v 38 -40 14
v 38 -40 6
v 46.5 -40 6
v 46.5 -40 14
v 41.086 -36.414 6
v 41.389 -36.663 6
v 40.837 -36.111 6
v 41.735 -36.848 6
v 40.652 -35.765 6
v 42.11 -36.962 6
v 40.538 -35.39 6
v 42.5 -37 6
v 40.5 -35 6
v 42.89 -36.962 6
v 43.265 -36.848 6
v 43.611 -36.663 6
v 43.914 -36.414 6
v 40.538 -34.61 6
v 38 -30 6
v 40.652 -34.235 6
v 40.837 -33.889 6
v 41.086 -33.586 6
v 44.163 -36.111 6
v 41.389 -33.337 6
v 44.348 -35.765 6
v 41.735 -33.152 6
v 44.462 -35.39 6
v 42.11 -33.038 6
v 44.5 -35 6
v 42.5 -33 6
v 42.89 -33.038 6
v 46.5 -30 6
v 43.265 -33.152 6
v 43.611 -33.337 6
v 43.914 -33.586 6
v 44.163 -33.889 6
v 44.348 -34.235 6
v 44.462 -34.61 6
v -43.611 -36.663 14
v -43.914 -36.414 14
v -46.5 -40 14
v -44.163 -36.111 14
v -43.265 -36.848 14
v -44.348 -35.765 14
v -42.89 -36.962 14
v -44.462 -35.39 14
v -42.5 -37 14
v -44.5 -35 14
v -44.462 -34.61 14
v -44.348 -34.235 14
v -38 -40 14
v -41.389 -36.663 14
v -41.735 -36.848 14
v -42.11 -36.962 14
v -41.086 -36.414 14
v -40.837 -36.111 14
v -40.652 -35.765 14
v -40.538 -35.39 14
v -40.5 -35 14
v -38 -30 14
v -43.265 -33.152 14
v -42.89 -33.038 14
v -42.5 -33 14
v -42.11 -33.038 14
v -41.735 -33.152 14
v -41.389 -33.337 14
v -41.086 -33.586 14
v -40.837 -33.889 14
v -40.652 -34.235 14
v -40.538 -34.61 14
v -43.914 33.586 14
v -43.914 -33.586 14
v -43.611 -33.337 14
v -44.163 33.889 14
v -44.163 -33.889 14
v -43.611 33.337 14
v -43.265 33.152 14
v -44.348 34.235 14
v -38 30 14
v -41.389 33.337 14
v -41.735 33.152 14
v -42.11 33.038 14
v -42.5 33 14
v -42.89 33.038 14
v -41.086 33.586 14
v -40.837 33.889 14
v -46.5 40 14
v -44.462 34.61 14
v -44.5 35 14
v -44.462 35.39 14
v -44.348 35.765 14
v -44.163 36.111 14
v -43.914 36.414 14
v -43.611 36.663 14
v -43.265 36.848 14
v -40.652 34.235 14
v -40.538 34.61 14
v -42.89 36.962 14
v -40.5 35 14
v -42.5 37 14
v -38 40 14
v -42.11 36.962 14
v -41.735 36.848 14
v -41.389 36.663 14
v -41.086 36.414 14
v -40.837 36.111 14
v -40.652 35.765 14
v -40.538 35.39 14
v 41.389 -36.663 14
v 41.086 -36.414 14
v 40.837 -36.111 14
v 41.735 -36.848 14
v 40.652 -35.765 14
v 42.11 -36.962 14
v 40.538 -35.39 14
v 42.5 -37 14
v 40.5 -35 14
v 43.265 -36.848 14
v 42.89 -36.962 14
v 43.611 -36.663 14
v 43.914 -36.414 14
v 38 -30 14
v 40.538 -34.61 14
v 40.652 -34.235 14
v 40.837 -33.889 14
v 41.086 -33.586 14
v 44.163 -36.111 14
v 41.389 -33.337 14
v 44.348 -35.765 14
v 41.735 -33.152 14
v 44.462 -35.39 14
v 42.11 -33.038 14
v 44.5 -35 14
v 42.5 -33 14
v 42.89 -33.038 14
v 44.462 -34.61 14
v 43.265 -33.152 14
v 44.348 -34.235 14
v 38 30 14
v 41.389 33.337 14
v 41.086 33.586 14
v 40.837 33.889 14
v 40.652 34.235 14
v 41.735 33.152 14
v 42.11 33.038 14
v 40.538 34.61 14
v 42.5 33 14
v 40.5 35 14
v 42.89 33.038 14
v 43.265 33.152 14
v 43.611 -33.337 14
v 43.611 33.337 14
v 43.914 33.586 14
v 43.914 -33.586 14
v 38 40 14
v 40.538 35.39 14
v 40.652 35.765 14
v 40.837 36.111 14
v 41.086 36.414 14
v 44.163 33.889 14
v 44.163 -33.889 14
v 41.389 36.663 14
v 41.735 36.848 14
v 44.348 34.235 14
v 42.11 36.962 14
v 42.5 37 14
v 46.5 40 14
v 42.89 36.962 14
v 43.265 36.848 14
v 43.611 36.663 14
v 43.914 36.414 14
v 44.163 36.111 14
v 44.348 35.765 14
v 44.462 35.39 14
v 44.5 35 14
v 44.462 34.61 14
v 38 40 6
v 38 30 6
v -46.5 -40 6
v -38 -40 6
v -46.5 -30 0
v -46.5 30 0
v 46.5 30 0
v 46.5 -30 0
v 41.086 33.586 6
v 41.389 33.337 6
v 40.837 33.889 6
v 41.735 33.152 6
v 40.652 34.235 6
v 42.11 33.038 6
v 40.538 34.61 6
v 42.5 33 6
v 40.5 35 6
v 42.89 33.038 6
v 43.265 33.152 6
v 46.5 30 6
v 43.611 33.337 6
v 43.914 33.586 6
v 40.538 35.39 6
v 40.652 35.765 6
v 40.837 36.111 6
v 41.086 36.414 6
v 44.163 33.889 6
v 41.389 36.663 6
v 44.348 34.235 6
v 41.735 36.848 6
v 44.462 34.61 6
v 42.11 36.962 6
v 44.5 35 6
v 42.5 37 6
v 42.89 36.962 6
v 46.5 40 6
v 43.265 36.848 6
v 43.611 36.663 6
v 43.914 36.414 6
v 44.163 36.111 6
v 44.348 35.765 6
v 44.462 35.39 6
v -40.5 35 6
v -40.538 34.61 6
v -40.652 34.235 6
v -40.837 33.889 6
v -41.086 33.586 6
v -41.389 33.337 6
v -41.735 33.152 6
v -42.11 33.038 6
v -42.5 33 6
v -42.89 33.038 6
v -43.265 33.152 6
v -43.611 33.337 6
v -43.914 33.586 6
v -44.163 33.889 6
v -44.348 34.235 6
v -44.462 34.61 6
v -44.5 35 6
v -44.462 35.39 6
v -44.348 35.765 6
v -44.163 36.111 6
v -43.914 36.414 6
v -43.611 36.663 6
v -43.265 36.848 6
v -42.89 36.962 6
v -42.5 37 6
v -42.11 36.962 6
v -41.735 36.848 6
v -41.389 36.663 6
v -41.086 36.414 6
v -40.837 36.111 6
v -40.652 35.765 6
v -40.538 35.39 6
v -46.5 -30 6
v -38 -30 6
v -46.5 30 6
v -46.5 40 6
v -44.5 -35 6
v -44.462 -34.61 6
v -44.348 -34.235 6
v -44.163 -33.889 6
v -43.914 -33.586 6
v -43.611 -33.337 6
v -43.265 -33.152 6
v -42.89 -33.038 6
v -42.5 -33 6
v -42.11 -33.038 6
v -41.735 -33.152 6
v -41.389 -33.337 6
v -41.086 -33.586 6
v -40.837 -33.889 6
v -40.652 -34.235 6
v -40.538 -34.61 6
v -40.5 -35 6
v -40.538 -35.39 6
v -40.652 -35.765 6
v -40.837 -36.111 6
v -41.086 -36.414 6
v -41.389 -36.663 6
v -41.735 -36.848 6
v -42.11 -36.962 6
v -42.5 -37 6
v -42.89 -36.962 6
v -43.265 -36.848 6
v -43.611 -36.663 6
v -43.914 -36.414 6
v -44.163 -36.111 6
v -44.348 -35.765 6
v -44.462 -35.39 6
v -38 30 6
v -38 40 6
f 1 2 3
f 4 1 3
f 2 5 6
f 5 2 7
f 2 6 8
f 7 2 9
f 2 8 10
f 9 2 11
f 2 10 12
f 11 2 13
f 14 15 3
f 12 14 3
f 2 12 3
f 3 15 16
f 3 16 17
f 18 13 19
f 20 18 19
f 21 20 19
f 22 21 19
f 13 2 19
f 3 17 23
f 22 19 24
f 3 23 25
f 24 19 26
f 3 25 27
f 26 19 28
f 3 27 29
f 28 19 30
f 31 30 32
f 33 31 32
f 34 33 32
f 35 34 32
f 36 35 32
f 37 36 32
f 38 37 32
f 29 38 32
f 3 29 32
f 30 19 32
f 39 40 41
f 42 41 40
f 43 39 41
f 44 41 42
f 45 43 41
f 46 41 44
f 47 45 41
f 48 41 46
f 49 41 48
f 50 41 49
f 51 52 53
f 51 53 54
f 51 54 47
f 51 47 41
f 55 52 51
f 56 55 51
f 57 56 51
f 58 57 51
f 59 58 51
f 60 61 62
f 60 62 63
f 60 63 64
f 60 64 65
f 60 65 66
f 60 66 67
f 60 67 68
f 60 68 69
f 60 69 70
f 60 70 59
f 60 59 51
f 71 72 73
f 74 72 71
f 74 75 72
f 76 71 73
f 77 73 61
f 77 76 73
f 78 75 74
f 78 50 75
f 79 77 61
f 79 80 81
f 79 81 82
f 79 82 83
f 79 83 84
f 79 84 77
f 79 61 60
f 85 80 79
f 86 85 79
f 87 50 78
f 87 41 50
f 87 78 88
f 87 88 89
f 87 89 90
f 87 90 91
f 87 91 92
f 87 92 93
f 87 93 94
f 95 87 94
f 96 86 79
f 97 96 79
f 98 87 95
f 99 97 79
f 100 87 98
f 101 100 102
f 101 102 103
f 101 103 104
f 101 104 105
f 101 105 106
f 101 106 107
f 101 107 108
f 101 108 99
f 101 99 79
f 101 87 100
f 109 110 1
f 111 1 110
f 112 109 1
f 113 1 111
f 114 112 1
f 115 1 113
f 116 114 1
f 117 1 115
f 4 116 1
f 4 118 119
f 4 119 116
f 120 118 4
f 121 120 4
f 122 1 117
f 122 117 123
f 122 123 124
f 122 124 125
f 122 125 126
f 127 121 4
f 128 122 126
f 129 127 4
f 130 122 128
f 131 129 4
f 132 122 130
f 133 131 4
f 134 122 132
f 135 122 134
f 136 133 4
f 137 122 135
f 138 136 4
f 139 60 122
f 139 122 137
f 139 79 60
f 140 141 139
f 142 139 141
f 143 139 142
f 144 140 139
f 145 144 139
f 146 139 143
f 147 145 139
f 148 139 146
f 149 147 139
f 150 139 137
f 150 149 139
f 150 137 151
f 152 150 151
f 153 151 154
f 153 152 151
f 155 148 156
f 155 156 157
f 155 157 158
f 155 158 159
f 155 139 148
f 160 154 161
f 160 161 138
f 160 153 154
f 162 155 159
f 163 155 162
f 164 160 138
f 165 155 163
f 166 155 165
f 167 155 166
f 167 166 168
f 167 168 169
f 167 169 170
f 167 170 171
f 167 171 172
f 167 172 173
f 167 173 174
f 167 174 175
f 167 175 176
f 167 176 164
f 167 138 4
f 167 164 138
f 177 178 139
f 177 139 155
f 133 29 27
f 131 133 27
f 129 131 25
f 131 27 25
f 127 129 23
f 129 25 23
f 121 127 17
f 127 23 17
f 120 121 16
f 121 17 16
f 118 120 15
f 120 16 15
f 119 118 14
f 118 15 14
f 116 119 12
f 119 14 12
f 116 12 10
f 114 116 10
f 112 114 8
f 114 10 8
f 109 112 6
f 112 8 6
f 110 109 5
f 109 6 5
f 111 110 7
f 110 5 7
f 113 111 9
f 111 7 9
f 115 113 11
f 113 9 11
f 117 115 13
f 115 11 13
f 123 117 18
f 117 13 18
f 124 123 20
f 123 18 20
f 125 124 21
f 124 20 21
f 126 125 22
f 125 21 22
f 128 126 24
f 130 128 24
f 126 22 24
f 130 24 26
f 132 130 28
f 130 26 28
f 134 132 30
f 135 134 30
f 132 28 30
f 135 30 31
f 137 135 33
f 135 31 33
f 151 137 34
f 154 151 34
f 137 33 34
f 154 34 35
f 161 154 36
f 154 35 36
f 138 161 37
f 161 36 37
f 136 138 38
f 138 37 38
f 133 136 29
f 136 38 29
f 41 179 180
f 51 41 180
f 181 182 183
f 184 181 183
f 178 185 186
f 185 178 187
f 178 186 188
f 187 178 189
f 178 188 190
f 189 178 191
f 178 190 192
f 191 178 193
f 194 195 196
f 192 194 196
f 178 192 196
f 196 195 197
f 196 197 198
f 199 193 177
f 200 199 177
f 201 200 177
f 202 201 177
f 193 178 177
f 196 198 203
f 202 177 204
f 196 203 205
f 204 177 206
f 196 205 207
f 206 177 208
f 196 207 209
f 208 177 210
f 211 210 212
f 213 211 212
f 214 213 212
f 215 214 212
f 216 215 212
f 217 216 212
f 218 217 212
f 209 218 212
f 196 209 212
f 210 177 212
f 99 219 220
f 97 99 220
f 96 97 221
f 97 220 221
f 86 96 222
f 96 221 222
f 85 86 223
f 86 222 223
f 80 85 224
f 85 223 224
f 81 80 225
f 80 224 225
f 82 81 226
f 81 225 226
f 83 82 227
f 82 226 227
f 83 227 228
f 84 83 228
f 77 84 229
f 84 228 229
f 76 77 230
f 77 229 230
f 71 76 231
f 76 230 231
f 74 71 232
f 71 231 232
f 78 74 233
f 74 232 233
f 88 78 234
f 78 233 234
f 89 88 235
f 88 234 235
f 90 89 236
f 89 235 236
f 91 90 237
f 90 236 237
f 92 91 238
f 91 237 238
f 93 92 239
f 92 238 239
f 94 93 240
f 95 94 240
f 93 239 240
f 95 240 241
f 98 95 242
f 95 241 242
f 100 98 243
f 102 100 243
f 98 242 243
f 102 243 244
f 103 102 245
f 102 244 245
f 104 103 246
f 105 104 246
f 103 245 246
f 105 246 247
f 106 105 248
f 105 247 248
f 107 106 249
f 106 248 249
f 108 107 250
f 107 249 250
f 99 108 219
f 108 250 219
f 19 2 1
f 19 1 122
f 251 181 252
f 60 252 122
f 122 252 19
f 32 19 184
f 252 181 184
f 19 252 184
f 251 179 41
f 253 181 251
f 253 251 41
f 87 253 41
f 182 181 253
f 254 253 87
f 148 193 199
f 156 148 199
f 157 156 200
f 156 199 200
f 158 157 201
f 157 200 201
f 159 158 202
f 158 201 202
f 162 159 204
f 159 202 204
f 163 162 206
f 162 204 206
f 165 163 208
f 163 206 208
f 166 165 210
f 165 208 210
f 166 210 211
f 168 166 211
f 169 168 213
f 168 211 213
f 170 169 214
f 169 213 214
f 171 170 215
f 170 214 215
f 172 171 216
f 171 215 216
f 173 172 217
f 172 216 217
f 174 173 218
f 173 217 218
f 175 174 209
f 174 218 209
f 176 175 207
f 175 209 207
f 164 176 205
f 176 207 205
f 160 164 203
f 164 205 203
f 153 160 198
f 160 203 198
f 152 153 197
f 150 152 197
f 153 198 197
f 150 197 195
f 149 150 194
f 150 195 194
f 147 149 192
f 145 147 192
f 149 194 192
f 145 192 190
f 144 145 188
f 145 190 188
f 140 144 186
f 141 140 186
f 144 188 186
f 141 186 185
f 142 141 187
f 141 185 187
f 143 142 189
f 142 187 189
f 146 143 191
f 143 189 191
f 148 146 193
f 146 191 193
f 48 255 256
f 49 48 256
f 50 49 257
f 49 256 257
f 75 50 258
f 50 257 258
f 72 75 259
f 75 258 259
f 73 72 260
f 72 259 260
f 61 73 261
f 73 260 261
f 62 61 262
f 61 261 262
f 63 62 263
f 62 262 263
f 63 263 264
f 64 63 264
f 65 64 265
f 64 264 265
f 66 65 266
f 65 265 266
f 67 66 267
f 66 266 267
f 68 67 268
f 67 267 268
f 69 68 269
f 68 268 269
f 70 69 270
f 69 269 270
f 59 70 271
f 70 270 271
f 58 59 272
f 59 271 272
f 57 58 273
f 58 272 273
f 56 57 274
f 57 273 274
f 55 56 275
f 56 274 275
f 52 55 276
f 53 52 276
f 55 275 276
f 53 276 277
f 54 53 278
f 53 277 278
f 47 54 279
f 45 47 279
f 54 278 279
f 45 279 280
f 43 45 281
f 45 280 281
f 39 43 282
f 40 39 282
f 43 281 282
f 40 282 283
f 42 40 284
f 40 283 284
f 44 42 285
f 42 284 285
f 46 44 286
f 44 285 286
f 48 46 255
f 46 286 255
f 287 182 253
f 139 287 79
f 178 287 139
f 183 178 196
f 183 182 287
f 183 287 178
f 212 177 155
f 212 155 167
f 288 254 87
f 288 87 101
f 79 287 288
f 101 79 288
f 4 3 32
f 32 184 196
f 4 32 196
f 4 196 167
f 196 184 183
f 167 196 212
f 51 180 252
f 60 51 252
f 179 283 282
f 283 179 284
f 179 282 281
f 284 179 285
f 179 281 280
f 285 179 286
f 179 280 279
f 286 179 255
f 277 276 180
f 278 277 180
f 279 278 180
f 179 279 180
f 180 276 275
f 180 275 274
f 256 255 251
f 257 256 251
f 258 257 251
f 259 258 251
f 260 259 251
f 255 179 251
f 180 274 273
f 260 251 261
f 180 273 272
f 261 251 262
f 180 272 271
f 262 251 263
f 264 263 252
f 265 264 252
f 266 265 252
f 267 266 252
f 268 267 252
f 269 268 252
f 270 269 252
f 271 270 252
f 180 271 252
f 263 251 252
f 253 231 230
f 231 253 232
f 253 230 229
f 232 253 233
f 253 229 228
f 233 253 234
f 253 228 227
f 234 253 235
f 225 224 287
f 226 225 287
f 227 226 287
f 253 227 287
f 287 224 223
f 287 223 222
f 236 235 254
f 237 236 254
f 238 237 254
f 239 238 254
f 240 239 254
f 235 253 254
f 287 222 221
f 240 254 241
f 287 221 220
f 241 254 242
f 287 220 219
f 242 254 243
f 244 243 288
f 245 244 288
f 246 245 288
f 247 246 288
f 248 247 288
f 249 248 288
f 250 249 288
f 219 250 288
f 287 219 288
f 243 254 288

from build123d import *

# Parameters (mm, degrees)
SKETCH_3_W          = 93
SKETCH_3_H          = 60
EXTRUDE_1_DEPTH     = 6
SKETCH_6_W          = 93
SKETCH_6_H          = 80
EXTRUDE_3_DEPTH     = 8
SKETCH_7_W          = 76
SKETCH_7_H          = 10
CUT_EXTRUDE_1_DEPTH = 8
SKETCH_8_R          = 2
CUT_EXTRUDE_2_DEPTH = 8


with BuildPart() as part:
    # 草图3 → 凸台-拉伸1 (new body)
    with BuildSketch(Plane.XY):
        Rectangle(SKETCH_3_W, SKETCH_3_H)
    extrude(amount=EXTRUDE_1_DEPTH)

    # 草图6 → 凸台-拉伸3 (add)
    with BuildSketch(Plane.XY.offset(6)):
        Rectangle(SKETCH_6_W, SKETCH_6_H)
    extrude(amount=EXTRUDE_3_DEPTH)

    # 草图7 → 切除-拉伸1 (cut)
    with BuildSketch(Plane(origin=(0, 0, 6), x_dir=(-1, 0, 0), z_dir=(0, 0, -1))):
        with Locations((0, 35)):
            Rectangle(SKETCH_7_W, SKETCH_7_H)
        with Locations((0, -35)):
            Rectangle(SKETCH_7_W, SKETCH_7_H)
    extrude(amount=-CUT_EXTRUDE_1_DEPTH, mode=Mode.SUBTRACT)

    # 草图8 → 切除-拉伸2 (cut)
    with BuildSketch(Plane(origin=(0, 0, 6), x_dir=(-1, 0, 0), z_dir=(0, 0, -1))):
        with Locations((-42.5, 35)):
            Circle(SKETCH_8_R)
        with Locations(Location((42.5, 35, 0), (0, 0, 180))):
            Circle(SKETCH_8_R)
        with Locations((42.5, -35)):
            Circle(SKETCH_8_R)
        with Locations(Location((-42.5, -35, 0), (0, 0, 180))):
            Circle(SKETCH_8_R)
    extrude(amount=-CUT_EXTRUDE_2_DEPTH, mode=Mode.SUBTRACT)


solid = part.part
